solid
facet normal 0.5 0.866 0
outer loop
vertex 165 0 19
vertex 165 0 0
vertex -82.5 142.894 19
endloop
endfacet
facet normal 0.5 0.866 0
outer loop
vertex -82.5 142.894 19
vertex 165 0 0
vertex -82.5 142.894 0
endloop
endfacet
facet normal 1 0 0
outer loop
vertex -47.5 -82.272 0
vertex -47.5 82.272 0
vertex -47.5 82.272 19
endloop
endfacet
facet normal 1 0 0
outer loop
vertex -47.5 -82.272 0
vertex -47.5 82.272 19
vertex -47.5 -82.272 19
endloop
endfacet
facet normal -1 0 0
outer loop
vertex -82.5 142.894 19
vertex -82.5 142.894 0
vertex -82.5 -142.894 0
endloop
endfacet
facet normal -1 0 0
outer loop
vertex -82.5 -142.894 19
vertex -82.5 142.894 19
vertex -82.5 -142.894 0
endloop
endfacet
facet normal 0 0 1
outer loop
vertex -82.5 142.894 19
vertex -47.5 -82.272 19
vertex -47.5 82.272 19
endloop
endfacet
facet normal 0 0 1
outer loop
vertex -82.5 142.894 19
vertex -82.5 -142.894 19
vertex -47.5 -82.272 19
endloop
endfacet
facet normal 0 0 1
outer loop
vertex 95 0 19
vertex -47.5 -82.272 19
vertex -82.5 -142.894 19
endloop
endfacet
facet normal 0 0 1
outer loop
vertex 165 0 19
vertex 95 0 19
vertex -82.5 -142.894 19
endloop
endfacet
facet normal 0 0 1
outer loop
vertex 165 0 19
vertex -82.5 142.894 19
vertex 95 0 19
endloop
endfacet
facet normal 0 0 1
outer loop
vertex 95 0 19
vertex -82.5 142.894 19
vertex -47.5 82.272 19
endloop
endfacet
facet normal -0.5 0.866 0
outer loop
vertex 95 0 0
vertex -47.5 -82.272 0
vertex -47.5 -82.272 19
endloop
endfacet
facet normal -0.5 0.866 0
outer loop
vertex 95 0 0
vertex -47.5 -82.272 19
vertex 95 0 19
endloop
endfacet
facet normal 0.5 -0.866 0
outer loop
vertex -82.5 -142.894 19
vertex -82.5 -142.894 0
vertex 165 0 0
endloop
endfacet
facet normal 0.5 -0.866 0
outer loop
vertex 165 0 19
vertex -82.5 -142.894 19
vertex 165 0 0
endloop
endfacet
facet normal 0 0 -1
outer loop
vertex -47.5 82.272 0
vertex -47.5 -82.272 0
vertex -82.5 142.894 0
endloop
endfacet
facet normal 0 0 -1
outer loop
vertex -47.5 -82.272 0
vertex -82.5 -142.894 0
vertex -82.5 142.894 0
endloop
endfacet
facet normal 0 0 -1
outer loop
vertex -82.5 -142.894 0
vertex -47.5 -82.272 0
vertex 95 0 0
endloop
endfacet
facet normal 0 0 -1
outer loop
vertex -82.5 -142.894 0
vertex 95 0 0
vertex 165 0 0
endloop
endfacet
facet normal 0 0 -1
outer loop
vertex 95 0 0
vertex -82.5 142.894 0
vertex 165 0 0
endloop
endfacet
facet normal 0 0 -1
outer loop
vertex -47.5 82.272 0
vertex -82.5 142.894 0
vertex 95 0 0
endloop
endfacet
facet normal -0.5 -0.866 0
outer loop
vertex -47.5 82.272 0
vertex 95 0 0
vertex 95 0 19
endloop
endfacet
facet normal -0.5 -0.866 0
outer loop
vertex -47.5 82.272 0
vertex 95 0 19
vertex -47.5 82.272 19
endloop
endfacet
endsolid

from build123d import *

# Parameters (mm, degrees)
PRISM001_DEPTH = 19
PRISM_DEPTH    = 19


with BuildPart() as prism001:
    # Prism001 → Prism001 (new body)
    with BuildSketch(Plane.XY):
        Polygon((95, 0), (-47.5, 82.272413), (-47.5, -82.272413), align=None)
    extrude(amount=PRISM001_DEPTH)


with BuildPart() as cut:
    # Prism → Prism (new body)
    with BuildSketch(Plane.XY):
        Polygon((165, 0), (-82.5, 142.894192), (-82.5, -142.894192), align=None)
    extrude(amount=PRISM_DEPTH)

    # Cut: cut Prism001
    add(prism001.part, mode=Mode.SUBTRACT)


solid = cut.part
